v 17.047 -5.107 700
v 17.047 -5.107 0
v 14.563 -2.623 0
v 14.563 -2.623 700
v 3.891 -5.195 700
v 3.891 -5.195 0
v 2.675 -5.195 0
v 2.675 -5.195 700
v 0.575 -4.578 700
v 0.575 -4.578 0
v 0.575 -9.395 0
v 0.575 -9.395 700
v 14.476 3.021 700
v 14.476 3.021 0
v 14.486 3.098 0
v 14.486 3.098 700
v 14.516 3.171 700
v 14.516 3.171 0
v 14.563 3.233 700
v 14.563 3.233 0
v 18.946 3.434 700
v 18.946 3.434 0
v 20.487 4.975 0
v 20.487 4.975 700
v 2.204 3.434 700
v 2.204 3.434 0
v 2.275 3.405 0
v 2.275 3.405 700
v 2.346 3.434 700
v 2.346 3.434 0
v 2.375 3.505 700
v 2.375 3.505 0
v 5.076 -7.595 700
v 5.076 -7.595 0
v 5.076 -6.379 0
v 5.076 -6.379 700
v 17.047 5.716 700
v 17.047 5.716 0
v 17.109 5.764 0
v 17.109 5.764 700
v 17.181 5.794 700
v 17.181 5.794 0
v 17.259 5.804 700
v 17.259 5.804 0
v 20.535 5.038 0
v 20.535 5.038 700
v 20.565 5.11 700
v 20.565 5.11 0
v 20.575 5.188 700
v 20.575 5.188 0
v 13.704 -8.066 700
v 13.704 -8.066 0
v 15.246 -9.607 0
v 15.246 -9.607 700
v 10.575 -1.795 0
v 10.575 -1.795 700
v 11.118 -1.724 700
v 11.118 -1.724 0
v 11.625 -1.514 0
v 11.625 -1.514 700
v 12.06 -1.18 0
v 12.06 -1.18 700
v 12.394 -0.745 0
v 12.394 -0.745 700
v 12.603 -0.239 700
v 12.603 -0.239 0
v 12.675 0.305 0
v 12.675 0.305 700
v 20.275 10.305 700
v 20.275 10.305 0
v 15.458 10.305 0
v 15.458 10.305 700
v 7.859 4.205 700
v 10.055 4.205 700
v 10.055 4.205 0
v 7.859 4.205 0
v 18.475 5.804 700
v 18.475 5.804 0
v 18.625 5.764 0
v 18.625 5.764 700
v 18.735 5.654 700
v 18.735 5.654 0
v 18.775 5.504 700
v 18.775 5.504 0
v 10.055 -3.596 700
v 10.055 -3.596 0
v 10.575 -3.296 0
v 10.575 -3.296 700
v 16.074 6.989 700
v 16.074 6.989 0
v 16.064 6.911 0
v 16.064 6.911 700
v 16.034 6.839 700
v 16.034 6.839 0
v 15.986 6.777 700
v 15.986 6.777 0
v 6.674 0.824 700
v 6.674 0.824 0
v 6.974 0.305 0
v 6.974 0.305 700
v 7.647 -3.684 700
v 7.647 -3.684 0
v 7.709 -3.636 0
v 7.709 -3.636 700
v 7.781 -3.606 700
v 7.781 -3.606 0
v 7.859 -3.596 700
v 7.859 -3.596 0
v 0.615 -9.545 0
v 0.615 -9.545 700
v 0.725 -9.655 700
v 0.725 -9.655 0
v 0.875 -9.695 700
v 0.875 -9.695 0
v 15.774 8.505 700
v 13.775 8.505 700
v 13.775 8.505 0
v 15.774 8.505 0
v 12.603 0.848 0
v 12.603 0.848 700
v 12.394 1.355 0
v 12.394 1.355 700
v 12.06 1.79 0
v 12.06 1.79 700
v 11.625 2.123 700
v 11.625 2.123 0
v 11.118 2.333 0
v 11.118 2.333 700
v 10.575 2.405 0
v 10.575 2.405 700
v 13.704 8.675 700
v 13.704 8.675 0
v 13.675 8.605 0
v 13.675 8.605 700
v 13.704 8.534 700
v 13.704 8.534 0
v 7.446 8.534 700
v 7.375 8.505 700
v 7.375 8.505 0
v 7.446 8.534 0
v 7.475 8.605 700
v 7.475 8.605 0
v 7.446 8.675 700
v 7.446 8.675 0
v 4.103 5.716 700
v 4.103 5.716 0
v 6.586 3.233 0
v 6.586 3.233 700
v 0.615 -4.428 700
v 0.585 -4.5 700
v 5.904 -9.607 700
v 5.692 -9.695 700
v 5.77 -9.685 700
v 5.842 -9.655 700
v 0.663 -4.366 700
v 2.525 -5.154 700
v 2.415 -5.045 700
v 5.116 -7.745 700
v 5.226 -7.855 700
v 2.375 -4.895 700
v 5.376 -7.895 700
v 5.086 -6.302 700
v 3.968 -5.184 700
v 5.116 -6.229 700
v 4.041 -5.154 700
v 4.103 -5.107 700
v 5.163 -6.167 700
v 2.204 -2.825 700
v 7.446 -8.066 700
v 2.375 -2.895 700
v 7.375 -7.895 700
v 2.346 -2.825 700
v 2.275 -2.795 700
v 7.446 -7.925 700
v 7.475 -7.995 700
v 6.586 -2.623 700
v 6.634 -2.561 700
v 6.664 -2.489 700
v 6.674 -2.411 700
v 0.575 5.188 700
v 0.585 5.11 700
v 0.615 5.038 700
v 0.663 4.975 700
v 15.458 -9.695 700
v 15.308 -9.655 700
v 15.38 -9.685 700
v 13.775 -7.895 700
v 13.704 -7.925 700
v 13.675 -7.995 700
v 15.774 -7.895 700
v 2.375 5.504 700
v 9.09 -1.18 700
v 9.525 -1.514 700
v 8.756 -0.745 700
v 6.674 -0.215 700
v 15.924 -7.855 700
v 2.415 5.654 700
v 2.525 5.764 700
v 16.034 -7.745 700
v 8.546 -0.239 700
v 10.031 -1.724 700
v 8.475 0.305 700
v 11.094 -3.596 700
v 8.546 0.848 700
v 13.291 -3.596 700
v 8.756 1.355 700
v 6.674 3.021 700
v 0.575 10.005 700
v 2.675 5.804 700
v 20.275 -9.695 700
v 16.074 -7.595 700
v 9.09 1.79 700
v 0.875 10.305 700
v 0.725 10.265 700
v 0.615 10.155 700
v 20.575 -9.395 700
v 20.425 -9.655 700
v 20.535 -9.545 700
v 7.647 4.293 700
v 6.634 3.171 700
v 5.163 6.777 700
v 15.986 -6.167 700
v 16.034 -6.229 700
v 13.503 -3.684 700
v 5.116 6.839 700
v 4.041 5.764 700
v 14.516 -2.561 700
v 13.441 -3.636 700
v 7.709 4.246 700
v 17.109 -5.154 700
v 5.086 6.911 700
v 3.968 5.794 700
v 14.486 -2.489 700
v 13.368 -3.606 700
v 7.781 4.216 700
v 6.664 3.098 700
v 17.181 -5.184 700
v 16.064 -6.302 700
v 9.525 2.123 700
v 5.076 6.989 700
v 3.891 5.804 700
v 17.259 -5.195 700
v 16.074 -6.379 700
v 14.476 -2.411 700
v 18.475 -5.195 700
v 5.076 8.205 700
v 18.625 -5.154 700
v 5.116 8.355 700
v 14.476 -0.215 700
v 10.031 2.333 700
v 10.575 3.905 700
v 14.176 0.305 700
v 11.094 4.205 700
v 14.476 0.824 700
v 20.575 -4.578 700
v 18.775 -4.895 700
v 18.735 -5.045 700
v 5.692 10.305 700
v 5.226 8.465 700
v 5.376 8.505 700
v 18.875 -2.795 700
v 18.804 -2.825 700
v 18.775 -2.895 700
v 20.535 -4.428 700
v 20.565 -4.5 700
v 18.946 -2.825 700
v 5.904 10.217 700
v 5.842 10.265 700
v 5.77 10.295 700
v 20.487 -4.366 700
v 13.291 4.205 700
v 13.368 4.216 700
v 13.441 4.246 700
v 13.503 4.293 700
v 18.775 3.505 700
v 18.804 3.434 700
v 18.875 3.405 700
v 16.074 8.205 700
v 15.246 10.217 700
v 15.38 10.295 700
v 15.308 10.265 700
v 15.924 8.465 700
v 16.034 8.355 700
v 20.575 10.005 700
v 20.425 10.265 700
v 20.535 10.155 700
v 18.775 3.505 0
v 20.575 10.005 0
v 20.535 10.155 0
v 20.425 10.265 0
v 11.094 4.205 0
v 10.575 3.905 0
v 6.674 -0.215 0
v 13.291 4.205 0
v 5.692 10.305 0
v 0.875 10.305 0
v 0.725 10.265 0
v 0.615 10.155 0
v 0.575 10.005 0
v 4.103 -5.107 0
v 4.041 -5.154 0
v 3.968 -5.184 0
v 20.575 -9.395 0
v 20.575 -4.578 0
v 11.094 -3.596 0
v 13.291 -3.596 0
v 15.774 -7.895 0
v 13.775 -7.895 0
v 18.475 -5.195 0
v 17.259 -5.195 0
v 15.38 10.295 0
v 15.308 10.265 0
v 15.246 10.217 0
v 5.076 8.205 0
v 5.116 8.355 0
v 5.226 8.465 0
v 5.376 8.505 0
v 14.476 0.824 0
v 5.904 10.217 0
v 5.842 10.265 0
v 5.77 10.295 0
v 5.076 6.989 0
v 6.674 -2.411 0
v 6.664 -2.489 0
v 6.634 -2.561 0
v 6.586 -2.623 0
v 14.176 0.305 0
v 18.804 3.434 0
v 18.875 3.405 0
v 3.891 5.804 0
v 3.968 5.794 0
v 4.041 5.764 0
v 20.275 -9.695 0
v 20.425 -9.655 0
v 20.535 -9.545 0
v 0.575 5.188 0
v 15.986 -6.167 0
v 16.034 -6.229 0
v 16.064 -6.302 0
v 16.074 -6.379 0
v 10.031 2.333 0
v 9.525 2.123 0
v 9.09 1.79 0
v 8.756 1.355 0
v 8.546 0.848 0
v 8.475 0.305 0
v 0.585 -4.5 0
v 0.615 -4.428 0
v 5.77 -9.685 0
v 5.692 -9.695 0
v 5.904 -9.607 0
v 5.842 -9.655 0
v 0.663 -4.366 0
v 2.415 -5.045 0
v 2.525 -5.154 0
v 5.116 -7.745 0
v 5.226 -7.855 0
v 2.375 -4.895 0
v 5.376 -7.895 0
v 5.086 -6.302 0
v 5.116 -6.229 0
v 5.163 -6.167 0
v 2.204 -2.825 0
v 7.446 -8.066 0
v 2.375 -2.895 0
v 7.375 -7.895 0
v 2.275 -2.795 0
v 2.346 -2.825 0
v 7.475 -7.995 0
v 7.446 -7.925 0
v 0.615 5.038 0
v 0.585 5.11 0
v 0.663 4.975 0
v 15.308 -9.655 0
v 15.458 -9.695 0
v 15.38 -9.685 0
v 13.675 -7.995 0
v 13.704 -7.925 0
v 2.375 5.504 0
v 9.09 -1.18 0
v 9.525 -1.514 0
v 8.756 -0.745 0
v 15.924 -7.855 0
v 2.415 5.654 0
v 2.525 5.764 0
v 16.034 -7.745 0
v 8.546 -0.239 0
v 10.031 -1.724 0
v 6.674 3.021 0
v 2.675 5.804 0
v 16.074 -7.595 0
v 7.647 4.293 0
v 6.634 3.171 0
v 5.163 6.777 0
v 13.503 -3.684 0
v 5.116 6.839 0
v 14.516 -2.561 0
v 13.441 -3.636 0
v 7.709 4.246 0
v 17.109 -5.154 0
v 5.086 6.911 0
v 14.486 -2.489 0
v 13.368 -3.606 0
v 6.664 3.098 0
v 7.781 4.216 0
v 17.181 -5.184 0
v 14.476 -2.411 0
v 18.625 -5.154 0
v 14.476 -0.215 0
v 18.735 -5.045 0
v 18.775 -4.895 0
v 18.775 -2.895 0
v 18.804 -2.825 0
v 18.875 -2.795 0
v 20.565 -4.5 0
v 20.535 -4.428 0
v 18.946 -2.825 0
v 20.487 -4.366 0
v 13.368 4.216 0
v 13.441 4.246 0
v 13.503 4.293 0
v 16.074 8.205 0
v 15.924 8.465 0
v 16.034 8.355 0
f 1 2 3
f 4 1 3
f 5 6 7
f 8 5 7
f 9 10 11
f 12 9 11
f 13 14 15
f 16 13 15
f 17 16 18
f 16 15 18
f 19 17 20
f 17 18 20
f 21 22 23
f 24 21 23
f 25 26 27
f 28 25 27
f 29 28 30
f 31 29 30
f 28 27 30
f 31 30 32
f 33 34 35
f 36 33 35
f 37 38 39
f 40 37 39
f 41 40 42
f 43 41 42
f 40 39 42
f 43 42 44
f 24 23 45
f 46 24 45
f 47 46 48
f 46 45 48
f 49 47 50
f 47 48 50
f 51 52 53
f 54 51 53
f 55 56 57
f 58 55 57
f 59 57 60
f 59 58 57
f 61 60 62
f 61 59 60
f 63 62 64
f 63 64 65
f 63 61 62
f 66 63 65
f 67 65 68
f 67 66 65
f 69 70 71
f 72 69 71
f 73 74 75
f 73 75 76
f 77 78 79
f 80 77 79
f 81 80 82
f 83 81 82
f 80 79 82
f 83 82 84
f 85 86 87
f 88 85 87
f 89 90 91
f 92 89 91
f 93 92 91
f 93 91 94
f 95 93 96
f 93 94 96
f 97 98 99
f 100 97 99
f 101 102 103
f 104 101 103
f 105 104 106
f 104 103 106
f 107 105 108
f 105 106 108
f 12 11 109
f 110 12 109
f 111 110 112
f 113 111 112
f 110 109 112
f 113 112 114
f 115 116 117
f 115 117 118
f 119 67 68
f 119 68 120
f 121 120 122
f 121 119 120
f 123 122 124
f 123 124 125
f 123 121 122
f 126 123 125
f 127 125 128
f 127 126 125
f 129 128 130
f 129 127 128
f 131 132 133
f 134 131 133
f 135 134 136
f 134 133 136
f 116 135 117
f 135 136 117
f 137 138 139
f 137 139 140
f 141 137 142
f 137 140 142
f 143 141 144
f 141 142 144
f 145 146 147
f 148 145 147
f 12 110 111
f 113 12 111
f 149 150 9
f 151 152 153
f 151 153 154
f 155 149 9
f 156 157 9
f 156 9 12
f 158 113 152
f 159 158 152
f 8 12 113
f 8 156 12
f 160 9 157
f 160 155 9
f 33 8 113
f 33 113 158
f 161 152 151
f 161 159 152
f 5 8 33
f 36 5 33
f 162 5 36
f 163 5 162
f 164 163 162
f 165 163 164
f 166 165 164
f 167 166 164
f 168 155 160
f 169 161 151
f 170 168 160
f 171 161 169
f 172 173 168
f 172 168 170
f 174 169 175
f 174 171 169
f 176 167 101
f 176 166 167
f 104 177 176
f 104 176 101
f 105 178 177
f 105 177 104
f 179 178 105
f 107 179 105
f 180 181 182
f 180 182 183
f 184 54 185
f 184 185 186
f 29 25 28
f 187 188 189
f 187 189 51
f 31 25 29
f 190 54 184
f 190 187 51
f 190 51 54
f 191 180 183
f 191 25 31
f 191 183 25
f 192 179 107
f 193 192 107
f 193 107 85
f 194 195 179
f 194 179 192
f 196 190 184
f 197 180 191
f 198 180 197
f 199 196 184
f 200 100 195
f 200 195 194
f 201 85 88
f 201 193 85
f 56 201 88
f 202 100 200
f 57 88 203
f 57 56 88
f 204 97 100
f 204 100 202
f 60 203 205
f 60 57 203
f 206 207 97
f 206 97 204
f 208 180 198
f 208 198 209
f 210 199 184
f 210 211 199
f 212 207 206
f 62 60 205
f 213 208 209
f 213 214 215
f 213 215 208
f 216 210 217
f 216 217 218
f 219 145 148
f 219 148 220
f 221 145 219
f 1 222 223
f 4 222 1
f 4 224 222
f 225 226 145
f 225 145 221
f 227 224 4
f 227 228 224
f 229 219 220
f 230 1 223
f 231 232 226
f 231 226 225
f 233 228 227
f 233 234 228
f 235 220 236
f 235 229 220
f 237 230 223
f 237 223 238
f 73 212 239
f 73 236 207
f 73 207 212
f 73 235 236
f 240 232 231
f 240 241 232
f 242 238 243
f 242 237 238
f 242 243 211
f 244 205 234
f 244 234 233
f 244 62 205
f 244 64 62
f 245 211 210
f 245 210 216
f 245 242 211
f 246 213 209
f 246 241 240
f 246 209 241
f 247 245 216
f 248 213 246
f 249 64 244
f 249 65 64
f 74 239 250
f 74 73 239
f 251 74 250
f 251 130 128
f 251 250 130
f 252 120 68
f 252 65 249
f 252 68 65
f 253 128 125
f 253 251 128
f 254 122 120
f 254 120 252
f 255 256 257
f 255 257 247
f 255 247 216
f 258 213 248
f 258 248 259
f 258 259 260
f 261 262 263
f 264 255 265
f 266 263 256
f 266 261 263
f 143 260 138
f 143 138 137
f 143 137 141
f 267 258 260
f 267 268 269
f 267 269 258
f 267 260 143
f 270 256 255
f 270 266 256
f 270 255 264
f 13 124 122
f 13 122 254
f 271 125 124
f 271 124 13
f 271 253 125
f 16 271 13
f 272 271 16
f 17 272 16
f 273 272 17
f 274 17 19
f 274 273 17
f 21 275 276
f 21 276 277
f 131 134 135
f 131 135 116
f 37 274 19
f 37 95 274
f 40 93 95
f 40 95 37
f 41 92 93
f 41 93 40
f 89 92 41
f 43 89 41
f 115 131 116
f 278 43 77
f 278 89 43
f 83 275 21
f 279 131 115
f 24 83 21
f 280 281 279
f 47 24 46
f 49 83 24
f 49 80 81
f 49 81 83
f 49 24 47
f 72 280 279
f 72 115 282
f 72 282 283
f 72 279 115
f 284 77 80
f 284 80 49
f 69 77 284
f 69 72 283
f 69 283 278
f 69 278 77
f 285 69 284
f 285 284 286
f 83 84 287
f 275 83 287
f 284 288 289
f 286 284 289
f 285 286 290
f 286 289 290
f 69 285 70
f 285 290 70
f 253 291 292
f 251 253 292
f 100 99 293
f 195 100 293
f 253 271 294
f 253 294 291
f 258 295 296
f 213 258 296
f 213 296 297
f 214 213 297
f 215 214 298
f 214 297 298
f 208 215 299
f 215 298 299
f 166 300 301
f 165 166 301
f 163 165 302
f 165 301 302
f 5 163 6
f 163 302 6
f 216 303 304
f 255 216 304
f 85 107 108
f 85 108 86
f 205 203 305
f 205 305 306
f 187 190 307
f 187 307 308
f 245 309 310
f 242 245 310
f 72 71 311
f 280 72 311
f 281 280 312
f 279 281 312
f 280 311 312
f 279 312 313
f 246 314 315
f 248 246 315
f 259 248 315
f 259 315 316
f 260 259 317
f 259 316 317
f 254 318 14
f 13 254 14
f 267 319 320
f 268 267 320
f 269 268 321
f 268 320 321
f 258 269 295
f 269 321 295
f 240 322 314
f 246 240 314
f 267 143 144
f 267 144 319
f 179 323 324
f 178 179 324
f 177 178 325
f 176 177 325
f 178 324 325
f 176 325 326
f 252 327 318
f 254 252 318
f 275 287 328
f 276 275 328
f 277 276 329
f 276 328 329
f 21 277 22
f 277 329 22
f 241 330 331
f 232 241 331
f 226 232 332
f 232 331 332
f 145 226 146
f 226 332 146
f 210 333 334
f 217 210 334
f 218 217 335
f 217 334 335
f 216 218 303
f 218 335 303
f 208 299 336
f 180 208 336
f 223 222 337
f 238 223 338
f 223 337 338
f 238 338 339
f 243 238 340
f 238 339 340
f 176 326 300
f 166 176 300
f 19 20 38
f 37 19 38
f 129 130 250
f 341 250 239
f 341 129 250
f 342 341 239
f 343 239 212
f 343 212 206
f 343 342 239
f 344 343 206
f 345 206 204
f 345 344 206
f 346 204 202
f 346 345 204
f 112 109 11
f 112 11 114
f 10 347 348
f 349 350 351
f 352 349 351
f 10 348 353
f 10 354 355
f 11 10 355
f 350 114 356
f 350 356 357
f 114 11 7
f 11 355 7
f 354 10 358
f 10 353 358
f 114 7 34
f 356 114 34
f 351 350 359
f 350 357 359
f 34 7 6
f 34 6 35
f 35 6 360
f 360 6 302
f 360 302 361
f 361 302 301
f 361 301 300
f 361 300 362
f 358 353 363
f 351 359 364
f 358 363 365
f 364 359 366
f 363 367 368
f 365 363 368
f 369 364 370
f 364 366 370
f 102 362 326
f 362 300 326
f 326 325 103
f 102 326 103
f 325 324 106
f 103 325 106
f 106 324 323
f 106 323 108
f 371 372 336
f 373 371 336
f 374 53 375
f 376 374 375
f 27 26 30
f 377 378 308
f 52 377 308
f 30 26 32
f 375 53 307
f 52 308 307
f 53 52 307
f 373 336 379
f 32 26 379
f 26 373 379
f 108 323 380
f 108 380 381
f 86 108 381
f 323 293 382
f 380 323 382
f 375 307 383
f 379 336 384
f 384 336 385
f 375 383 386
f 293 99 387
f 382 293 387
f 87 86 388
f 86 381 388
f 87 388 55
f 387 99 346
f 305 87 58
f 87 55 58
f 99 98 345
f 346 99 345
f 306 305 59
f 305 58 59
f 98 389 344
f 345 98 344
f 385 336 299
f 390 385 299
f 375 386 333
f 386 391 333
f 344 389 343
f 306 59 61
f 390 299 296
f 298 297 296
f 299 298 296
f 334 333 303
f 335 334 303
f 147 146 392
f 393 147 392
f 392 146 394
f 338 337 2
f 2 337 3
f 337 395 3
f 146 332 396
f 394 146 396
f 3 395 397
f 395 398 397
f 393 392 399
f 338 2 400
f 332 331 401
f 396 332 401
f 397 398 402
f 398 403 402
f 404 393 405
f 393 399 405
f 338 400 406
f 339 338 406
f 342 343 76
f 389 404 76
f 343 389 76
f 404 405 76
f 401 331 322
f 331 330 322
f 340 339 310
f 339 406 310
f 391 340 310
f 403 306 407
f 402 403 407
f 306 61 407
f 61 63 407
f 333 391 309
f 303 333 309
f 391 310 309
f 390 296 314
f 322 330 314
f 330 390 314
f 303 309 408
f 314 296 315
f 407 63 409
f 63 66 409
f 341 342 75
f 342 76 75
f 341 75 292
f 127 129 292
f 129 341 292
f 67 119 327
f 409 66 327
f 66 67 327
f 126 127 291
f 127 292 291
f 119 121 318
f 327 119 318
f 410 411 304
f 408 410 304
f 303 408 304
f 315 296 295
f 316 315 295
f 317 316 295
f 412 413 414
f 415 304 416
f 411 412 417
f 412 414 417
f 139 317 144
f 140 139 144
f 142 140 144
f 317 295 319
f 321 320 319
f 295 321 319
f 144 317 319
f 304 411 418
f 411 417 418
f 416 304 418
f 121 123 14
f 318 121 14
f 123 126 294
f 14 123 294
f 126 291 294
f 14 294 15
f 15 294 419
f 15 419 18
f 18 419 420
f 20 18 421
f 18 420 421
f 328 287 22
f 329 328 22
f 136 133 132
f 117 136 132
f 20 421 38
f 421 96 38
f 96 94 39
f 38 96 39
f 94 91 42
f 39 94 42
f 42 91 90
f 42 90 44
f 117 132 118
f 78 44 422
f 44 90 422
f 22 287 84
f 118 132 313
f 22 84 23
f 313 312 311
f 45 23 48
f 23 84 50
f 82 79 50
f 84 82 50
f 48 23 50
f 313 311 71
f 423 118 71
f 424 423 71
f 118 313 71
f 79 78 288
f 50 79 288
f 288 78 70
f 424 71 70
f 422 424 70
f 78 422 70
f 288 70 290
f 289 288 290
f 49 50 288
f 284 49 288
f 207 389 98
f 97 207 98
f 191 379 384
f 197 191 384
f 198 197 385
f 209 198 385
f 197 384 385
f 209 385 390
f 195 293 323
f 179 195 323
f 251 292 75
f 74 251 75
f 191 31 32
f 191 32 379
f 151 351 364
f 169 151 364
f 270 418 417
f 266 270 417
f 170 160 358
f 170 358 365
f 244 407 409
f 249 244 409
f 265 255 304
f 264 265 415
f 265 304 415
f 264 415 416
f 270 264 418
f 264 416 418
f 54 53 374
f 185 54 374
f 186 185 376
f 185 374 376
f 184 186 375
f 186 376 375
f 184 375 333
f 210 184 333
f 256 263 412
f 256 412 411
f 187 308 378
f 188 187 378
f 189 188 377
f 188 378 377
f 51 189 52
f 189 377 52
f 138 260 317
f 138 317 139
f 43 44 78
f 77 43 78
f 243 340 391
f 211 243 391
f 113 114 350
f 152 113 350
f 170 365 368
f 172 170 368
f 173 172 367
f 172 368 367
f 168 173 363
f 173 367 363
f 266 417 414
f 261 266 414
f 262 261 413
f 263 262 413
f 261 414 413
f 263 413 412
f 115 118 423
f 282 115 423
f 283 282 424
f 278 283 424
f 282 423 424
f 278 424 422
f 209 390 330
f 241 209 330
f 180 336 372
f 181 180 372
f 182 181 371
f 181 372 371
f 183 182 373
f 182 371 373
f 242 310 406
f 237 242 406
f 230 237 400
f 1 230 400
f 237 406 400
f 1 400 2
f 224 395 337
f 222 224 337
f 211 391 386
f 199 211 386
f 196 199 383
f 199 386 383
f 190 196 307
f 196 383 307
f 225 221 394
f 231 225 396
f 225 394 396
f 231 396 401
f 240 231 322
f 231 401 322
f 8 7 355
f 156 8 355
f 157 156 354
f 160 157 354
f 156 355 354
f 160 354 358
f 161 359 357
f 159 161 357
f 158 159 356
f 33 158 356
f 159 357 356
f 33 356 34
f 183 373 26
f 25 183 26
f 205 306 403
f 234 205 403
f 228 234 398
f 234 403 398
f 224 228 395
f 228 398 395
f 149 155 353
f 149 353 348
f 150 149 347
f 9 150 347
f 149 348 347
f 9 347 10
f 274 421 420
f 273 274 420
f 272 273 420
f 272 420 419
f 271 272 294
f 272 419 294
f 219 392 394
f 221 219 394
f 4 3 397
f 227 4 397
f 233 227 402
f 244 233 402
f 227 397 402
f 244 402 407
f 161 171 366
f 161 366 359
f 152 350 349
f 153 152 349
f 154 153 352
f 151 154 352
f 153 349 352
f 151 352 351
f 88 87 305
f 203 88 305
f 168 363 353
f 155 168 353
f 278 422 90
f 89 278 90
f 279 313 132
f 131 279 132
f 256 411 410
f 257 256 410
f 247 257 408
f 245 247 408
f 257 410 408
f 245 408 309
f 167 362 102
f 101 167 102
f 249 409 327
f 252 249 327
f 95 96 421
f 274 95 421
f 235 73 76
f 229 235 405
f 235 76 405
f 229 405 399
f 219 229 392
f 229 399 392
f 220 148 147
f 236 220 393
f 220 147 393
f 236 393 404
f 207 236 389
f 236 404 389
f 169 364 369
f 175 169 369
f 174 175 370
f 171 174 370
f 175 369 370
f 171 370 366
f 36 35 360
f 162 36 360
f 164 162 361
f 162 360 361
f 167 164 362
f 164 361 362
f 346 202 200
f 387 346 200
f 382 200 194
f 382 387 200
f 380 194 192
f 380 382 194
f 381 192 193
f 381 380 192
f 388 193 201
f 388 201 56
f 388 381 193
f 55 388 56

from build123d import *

# Parameters (mm, degrees)
BOSS_EXTRU_1_DEPTH = 700


with BuildPart() as part:
    # Esquisse1 → Boss.-Extru.1 (new body)
    with BuildSketch(Plane.XY):
        with BuildLine():
            Line((18.774857412, -2.895228684), (18.774857412, -4.894568513))
            ThreePointArc((18.774857412, -4.894568513), (18.686989447, -5.106700547), (18.474857412, -5.194568513))
            Line((18.474857412, -5.194568513), (17.259121481, -5.194568513))
            ThreePointArc((17.259121481, -5.194568513), (17.144316451, -5.171732372), (17.046989447, -5.106700547))
            Line((17.046989447, -5.106700547), (14.56338555, -2.62309665))
            ThreePointArc((14.56338555, -2.62309665), (14.498353724, -2.525769645), (14.475517584, -2.410964616))
            Line((14.475517584, -2.410964616), (14.475517584, -0.214843927))
            Line((14.475517584, -0.214843927), (14.175517584, 0.304771316))
            Line((14.175517584, 0.304771316), (14.475517584, 0.824386558))
            Line((14.475517584, 0.824386558), (14.475517584, 3.020507247))
            ThreePointArc((14.475517584, 3.020507247), (14.498353724, 3.135312277), (14.56338555, 3.232639281))
            Line((14.56338555, 3.232639281), (17.046989447, 5.716243178))
            ThreePointArc((17.046989447, 5.716243178), (17.144316451, 5.781275004), (17.259121481, 5.804111144))
            Line((17.259121481, 5.804111144), (18.474857412, 5.804111144))
            ThreePointArc((18.474857412, 5.804111144), (18.686989447, 5.716243178), (18.774857412, 5.504111144))
            Line((18.774857412, 5.504111144), (18.774857412, 3.504771316))
            ThreePointArc((18.774857412, 3.504771316), (18.836589069, 3.412383362), (18.94556809, 3.434060638))
            Line((18.94556809, 3.434060638), (20.486989447, 4.975481994))
            ThreePointArc((20.486989447, 4.975481994), (20.552021272, 5.072808998), (20.574857412, 5.187614028))
            Line((20.574857412, 5.187614028), (20.574857412, 10.004771316))
            ThreePointArc((20.574857412, 10.004771316), (20.486989447, 10.21690335), (20.274857412, 10.304771316))
            Line((20.274857412, 10.304771316), (15.457700125, 10.304771316))
            ThreePointArc((15.457700125, 10.304771316), (15.342895095, 10.281935175), (15.24556809, 10.21690335))
            Line((15.24556809, 10.21690335), (13.704146734, 8.675481994))
            ThreePointArc((13.704146734, 8.675481994), (13.682469459, 8.566502972), (13.774857412, 8.504771316))
            Line((13.774857412, 8.504771316), (15.77419724, 8.504771316))
            ThreePointArc((15.77419724, 8.504771316), (15.986329275, 8.41690335), (16.07419724, 8.204771316))
            Line((16.07419724, 8.204771316), (16.07419724, 6.989035384))
            ThreePointArc((16.07419724, 6.989035384), (16.0513611, 6.874230355), (15.986329275, 6.77690335))
            Line((15.986329275, 6.77690335), (13.502725378, 4.293299453))
            ThreePointArc((13.502725378, 4.293299453), (13.405398373, 4.228267628), (13.290593344, 4.205431487))
            Line((13.290593344, 4.205431487), (11.094472654, 4.205431487))
            Line((11.094472654, 4.205431487), (10.574857412, 3.905431487))
            Line((10.574857412, 3.905431487), (10.05524217, 4.205431487))
            Line((10.05524217, 4.205431487), (7.859121481, 4.205431487))
            ThreePointArc((7.859121481, 4.205431487), (7.744316451, 4.228267628), (7.646989447, 4.293299453))
            Line((7.646989447, 4.293299453), (5.16338555, 6.77690335))
            ThreePointArc((5.16338555, 6.77690335), (5.098353724, 6.874230355), (5.075517584, 6.989035384))
            Line((5.075517584, 6.989035384), (5.075517584, 8.204771316))
            ThreePointArc((5.075517584, 8.204771316), (5.16338555, 8.41690335), (5.375517584, 8.504771316))
            Line((5.375517584, 8.504771316), (7.374857412, 8.504771316))
            ThreePointArc((7.374857412, 8.504771316), (7.467245365, 8.566502972), (7.44556809, 8.675481994))
            Line((7.44556809, 8.675481994), (5.904146734, 10.21690335))
            ThreePointArc((5.904146734, 10.21690335), (5.806819729, 10.281935175), (5.6920147, 10.304771316))
            Line((5.6920147, 10.304771316), (0.874857412, 10.304771316))
            ThreePointArc((0.874857412, 10.304771316), (0.662725378, 10.21690335), (0.574857412, 10.004771316))
            Line((0.574857412, 10.004771316), (0.574857412, 5.187614028))
            ThreePointArc((0.574857412, 5.187614028), (0.597693552, 5.072808998), (0.662725378, 4.975481994))
            Line((0.662725378, 4.975481994), (2.204146734, 3.434060638))
            ThreePointArc((2.204146734, 3.434060638), (2.313125755, 3.412383362), (2.374857412, 3.504771316))
            Line((2.374857412, 3.504771316), (2.374857412, 5.504111144))
            ThreePointArc((2.374857412, 5.504111144), (2.462725378, 5.716243178), (2.674857412, 5.804111144))
            Line((2.674857412, 5.804111144), (3.890593344, 5.804111144))
            ThreePointArc((3.890593344, 5.804111144), (4.005398373, 5.781275004), (4.102725378, 5.716243178))
            Line((4.102725378, 5.716243178), (6.586329275, 3.232639281))
            ThreePointArc((6.586329275, 3.232639281), (6.6513611, 3.135312277), (6.67419724, 3.020507247))
            Line((6.67419724, 3.020507247), (6.67419724, 0.824386558))
            Line((6.67419724, 0.824386558), (6.97419724, 0.304771316))
            Line((6.97419724, 0.304771316), (6.67419724, -0.214843927))
            Line((6.67419724, -0.214843927), (6.67419724, -2.410964616))
            ThreePointArc((6.67419724, -2.410964616), (6.6513611, -2.525769645), (6.586329275, -2.62309665))
            Line((6.586329275, -2.62309665), (4.102725378, -5.106700547))
            ThreePointArc((4.102725378, -5.106700547), (4.005398373, -5.171732372), (3.890593344, -5.194568513))
            Line((3.890593344, -5.194568513), (2.674857412, -5.194568513))
            ThreePointArc((2.674857412, -5.194568513), (2.462725378, -5.106700547), (2.374857412, -4.894568513))
            Line((2.374857412, -4.894568513), (2.374857412, -2.895228684))
            ThreePointArc((2.374857412, -2.895228684), (2.313125755, -2.802840731), (2.204146734, -2.824518006))
            Line((2.204146734, -2.824518006), (0.662725378, -4.365939362))
            ThreePointArc((0.662725378, -4.365939362), (0.597693552, -4.463266367), (0.574857412, -4.578071397))
            Line((0.574857412, -4.578071397), (0.574857412, -9.395228684))
            ThreePointArc((0.574857412, -9.395228684), (0.662725378, -9.607360719), (0.874857412, -9.695228684))
            Line((0.874857412, -9.695228684), (5.6920147, -9.695228684))
            ThreePointArc((5.6920147, -9.695228684), (5.806819729, -9.672392544), (5.904146734, -9.607360719))
            Line((5.904146734, -9.607360719), (7.44556809, -8.065939362))
            ThreePointArc((7.44556809, -8.065939362), (7.467245365, -7.956960341), (7.374857412, -7.895228684))
            Line((7.374857412, -7.895228684), (5.375517584, -7.895228684))
            ThreePointArc((5.375517584, -7.895228684), (5.16338555, -7.807360719), (5.075517584, -7.595228684))
            Line((5.075517584, -7.595228684), (5.075517584, -6.379492753))
            ThreePointArc((5.075517584, -6.379492753), (5.098353724, -6.264687723), (5.16338555, -6.167360719))
            Line((5.16338555, -6.167360719), (7.646989447, -3.683756822))
            ThreePointArc((7.646989447, -3.683756822), (7.744316451, -3.618724996), (7.859121481, -3.595888856))
            Line((7.859121481, -3.595888856), (10.05524217, -3.595888856))
            Line((10.05524217, -3.595888856), (10.574857412, -3.295888856))
            Line((10.574857412, -3.295888856), (11.094472654, -3.595888856))
            Line((11.094472654, -3.595888856), (13.290593344, -3.595888856))
            ThreePointArc((13.290593344, -3.595888856), (13.405398373, -3.618724996), (13.502725378, -3.683756822))
            Line((13.502725378, -3.683756822), (15.986329275, -6.167360719))
            ThreePointArc((15.986329275, -6.167360719), (16.0513611, -6.264687723), (16.07419724, -6.379492753))
            Line((16.07419724, -6.379492753), (16.07419724, -7.595228684))
            ThreePointArc((16.07419724, -7.595228684), (15.986329275, -7.807360719), (15.77419724, -7.895228684))
            Line((15.77419724, -7.895228684), (13.774857412, -7.895228684))
            ThreePointArc((13.774857412, -7.895228684), (13.682469459, -7.956960341), (13.704146734, -8.065939362))
            Line((13.704146734, -8.065939362), (15.24556809, -9.607360719))
            ThreePointArc((15.24556809, -9.607360719), (15.342895095, -9.672392544), (15.457700125, -9.695228684))
            Line((15.457700125, -9.695228684), (20.274857412, -9.695228684))
            ThreePointArc((20.274857412, -9.695228684), (20.486989447, -9.607360719), (20.574857412, -9.395228684))
            Line((20.574857412, -9.395228684), (20.574857412, -4.578071397))
            ThreePointArc((20.574857412, -4.578071397), (20.552021272, -4.463266367), (20.486989447, -4.365939362))
            Line((20.486989447, -4.365939362), (18.94556809, -2.824518006))
            ThreePointArc((18.94556809, -2.824518006), (18.836589069, -2.802840731), (18.774857412, -2.895228684))
        make_face()
        with BuildLine():
            ThreePointArc((10.574857412, -1.795228684), (12.059781653, -1.180152925), (12.674857412, 0.304771316))
            ThreePointArc((12.674857412, 0.304771316), (12.059781653, 1.789695556), (10.574857412, 2.404771316))
            ThreePointArc((10.574857412, 2.404771316), (9.089933172, 1.789695556), (8.474857412, 0.304771316))
            ThreePointArc((8.474857412, 0.304771316), (9.089933172, -1.180152925), (10.574857412, -1.795228684))
        make_face(mode=Mode.SUBTRACT)
    extrude(amount=BOSS_EXTRU_1_DEPTH)


solid = part.part
